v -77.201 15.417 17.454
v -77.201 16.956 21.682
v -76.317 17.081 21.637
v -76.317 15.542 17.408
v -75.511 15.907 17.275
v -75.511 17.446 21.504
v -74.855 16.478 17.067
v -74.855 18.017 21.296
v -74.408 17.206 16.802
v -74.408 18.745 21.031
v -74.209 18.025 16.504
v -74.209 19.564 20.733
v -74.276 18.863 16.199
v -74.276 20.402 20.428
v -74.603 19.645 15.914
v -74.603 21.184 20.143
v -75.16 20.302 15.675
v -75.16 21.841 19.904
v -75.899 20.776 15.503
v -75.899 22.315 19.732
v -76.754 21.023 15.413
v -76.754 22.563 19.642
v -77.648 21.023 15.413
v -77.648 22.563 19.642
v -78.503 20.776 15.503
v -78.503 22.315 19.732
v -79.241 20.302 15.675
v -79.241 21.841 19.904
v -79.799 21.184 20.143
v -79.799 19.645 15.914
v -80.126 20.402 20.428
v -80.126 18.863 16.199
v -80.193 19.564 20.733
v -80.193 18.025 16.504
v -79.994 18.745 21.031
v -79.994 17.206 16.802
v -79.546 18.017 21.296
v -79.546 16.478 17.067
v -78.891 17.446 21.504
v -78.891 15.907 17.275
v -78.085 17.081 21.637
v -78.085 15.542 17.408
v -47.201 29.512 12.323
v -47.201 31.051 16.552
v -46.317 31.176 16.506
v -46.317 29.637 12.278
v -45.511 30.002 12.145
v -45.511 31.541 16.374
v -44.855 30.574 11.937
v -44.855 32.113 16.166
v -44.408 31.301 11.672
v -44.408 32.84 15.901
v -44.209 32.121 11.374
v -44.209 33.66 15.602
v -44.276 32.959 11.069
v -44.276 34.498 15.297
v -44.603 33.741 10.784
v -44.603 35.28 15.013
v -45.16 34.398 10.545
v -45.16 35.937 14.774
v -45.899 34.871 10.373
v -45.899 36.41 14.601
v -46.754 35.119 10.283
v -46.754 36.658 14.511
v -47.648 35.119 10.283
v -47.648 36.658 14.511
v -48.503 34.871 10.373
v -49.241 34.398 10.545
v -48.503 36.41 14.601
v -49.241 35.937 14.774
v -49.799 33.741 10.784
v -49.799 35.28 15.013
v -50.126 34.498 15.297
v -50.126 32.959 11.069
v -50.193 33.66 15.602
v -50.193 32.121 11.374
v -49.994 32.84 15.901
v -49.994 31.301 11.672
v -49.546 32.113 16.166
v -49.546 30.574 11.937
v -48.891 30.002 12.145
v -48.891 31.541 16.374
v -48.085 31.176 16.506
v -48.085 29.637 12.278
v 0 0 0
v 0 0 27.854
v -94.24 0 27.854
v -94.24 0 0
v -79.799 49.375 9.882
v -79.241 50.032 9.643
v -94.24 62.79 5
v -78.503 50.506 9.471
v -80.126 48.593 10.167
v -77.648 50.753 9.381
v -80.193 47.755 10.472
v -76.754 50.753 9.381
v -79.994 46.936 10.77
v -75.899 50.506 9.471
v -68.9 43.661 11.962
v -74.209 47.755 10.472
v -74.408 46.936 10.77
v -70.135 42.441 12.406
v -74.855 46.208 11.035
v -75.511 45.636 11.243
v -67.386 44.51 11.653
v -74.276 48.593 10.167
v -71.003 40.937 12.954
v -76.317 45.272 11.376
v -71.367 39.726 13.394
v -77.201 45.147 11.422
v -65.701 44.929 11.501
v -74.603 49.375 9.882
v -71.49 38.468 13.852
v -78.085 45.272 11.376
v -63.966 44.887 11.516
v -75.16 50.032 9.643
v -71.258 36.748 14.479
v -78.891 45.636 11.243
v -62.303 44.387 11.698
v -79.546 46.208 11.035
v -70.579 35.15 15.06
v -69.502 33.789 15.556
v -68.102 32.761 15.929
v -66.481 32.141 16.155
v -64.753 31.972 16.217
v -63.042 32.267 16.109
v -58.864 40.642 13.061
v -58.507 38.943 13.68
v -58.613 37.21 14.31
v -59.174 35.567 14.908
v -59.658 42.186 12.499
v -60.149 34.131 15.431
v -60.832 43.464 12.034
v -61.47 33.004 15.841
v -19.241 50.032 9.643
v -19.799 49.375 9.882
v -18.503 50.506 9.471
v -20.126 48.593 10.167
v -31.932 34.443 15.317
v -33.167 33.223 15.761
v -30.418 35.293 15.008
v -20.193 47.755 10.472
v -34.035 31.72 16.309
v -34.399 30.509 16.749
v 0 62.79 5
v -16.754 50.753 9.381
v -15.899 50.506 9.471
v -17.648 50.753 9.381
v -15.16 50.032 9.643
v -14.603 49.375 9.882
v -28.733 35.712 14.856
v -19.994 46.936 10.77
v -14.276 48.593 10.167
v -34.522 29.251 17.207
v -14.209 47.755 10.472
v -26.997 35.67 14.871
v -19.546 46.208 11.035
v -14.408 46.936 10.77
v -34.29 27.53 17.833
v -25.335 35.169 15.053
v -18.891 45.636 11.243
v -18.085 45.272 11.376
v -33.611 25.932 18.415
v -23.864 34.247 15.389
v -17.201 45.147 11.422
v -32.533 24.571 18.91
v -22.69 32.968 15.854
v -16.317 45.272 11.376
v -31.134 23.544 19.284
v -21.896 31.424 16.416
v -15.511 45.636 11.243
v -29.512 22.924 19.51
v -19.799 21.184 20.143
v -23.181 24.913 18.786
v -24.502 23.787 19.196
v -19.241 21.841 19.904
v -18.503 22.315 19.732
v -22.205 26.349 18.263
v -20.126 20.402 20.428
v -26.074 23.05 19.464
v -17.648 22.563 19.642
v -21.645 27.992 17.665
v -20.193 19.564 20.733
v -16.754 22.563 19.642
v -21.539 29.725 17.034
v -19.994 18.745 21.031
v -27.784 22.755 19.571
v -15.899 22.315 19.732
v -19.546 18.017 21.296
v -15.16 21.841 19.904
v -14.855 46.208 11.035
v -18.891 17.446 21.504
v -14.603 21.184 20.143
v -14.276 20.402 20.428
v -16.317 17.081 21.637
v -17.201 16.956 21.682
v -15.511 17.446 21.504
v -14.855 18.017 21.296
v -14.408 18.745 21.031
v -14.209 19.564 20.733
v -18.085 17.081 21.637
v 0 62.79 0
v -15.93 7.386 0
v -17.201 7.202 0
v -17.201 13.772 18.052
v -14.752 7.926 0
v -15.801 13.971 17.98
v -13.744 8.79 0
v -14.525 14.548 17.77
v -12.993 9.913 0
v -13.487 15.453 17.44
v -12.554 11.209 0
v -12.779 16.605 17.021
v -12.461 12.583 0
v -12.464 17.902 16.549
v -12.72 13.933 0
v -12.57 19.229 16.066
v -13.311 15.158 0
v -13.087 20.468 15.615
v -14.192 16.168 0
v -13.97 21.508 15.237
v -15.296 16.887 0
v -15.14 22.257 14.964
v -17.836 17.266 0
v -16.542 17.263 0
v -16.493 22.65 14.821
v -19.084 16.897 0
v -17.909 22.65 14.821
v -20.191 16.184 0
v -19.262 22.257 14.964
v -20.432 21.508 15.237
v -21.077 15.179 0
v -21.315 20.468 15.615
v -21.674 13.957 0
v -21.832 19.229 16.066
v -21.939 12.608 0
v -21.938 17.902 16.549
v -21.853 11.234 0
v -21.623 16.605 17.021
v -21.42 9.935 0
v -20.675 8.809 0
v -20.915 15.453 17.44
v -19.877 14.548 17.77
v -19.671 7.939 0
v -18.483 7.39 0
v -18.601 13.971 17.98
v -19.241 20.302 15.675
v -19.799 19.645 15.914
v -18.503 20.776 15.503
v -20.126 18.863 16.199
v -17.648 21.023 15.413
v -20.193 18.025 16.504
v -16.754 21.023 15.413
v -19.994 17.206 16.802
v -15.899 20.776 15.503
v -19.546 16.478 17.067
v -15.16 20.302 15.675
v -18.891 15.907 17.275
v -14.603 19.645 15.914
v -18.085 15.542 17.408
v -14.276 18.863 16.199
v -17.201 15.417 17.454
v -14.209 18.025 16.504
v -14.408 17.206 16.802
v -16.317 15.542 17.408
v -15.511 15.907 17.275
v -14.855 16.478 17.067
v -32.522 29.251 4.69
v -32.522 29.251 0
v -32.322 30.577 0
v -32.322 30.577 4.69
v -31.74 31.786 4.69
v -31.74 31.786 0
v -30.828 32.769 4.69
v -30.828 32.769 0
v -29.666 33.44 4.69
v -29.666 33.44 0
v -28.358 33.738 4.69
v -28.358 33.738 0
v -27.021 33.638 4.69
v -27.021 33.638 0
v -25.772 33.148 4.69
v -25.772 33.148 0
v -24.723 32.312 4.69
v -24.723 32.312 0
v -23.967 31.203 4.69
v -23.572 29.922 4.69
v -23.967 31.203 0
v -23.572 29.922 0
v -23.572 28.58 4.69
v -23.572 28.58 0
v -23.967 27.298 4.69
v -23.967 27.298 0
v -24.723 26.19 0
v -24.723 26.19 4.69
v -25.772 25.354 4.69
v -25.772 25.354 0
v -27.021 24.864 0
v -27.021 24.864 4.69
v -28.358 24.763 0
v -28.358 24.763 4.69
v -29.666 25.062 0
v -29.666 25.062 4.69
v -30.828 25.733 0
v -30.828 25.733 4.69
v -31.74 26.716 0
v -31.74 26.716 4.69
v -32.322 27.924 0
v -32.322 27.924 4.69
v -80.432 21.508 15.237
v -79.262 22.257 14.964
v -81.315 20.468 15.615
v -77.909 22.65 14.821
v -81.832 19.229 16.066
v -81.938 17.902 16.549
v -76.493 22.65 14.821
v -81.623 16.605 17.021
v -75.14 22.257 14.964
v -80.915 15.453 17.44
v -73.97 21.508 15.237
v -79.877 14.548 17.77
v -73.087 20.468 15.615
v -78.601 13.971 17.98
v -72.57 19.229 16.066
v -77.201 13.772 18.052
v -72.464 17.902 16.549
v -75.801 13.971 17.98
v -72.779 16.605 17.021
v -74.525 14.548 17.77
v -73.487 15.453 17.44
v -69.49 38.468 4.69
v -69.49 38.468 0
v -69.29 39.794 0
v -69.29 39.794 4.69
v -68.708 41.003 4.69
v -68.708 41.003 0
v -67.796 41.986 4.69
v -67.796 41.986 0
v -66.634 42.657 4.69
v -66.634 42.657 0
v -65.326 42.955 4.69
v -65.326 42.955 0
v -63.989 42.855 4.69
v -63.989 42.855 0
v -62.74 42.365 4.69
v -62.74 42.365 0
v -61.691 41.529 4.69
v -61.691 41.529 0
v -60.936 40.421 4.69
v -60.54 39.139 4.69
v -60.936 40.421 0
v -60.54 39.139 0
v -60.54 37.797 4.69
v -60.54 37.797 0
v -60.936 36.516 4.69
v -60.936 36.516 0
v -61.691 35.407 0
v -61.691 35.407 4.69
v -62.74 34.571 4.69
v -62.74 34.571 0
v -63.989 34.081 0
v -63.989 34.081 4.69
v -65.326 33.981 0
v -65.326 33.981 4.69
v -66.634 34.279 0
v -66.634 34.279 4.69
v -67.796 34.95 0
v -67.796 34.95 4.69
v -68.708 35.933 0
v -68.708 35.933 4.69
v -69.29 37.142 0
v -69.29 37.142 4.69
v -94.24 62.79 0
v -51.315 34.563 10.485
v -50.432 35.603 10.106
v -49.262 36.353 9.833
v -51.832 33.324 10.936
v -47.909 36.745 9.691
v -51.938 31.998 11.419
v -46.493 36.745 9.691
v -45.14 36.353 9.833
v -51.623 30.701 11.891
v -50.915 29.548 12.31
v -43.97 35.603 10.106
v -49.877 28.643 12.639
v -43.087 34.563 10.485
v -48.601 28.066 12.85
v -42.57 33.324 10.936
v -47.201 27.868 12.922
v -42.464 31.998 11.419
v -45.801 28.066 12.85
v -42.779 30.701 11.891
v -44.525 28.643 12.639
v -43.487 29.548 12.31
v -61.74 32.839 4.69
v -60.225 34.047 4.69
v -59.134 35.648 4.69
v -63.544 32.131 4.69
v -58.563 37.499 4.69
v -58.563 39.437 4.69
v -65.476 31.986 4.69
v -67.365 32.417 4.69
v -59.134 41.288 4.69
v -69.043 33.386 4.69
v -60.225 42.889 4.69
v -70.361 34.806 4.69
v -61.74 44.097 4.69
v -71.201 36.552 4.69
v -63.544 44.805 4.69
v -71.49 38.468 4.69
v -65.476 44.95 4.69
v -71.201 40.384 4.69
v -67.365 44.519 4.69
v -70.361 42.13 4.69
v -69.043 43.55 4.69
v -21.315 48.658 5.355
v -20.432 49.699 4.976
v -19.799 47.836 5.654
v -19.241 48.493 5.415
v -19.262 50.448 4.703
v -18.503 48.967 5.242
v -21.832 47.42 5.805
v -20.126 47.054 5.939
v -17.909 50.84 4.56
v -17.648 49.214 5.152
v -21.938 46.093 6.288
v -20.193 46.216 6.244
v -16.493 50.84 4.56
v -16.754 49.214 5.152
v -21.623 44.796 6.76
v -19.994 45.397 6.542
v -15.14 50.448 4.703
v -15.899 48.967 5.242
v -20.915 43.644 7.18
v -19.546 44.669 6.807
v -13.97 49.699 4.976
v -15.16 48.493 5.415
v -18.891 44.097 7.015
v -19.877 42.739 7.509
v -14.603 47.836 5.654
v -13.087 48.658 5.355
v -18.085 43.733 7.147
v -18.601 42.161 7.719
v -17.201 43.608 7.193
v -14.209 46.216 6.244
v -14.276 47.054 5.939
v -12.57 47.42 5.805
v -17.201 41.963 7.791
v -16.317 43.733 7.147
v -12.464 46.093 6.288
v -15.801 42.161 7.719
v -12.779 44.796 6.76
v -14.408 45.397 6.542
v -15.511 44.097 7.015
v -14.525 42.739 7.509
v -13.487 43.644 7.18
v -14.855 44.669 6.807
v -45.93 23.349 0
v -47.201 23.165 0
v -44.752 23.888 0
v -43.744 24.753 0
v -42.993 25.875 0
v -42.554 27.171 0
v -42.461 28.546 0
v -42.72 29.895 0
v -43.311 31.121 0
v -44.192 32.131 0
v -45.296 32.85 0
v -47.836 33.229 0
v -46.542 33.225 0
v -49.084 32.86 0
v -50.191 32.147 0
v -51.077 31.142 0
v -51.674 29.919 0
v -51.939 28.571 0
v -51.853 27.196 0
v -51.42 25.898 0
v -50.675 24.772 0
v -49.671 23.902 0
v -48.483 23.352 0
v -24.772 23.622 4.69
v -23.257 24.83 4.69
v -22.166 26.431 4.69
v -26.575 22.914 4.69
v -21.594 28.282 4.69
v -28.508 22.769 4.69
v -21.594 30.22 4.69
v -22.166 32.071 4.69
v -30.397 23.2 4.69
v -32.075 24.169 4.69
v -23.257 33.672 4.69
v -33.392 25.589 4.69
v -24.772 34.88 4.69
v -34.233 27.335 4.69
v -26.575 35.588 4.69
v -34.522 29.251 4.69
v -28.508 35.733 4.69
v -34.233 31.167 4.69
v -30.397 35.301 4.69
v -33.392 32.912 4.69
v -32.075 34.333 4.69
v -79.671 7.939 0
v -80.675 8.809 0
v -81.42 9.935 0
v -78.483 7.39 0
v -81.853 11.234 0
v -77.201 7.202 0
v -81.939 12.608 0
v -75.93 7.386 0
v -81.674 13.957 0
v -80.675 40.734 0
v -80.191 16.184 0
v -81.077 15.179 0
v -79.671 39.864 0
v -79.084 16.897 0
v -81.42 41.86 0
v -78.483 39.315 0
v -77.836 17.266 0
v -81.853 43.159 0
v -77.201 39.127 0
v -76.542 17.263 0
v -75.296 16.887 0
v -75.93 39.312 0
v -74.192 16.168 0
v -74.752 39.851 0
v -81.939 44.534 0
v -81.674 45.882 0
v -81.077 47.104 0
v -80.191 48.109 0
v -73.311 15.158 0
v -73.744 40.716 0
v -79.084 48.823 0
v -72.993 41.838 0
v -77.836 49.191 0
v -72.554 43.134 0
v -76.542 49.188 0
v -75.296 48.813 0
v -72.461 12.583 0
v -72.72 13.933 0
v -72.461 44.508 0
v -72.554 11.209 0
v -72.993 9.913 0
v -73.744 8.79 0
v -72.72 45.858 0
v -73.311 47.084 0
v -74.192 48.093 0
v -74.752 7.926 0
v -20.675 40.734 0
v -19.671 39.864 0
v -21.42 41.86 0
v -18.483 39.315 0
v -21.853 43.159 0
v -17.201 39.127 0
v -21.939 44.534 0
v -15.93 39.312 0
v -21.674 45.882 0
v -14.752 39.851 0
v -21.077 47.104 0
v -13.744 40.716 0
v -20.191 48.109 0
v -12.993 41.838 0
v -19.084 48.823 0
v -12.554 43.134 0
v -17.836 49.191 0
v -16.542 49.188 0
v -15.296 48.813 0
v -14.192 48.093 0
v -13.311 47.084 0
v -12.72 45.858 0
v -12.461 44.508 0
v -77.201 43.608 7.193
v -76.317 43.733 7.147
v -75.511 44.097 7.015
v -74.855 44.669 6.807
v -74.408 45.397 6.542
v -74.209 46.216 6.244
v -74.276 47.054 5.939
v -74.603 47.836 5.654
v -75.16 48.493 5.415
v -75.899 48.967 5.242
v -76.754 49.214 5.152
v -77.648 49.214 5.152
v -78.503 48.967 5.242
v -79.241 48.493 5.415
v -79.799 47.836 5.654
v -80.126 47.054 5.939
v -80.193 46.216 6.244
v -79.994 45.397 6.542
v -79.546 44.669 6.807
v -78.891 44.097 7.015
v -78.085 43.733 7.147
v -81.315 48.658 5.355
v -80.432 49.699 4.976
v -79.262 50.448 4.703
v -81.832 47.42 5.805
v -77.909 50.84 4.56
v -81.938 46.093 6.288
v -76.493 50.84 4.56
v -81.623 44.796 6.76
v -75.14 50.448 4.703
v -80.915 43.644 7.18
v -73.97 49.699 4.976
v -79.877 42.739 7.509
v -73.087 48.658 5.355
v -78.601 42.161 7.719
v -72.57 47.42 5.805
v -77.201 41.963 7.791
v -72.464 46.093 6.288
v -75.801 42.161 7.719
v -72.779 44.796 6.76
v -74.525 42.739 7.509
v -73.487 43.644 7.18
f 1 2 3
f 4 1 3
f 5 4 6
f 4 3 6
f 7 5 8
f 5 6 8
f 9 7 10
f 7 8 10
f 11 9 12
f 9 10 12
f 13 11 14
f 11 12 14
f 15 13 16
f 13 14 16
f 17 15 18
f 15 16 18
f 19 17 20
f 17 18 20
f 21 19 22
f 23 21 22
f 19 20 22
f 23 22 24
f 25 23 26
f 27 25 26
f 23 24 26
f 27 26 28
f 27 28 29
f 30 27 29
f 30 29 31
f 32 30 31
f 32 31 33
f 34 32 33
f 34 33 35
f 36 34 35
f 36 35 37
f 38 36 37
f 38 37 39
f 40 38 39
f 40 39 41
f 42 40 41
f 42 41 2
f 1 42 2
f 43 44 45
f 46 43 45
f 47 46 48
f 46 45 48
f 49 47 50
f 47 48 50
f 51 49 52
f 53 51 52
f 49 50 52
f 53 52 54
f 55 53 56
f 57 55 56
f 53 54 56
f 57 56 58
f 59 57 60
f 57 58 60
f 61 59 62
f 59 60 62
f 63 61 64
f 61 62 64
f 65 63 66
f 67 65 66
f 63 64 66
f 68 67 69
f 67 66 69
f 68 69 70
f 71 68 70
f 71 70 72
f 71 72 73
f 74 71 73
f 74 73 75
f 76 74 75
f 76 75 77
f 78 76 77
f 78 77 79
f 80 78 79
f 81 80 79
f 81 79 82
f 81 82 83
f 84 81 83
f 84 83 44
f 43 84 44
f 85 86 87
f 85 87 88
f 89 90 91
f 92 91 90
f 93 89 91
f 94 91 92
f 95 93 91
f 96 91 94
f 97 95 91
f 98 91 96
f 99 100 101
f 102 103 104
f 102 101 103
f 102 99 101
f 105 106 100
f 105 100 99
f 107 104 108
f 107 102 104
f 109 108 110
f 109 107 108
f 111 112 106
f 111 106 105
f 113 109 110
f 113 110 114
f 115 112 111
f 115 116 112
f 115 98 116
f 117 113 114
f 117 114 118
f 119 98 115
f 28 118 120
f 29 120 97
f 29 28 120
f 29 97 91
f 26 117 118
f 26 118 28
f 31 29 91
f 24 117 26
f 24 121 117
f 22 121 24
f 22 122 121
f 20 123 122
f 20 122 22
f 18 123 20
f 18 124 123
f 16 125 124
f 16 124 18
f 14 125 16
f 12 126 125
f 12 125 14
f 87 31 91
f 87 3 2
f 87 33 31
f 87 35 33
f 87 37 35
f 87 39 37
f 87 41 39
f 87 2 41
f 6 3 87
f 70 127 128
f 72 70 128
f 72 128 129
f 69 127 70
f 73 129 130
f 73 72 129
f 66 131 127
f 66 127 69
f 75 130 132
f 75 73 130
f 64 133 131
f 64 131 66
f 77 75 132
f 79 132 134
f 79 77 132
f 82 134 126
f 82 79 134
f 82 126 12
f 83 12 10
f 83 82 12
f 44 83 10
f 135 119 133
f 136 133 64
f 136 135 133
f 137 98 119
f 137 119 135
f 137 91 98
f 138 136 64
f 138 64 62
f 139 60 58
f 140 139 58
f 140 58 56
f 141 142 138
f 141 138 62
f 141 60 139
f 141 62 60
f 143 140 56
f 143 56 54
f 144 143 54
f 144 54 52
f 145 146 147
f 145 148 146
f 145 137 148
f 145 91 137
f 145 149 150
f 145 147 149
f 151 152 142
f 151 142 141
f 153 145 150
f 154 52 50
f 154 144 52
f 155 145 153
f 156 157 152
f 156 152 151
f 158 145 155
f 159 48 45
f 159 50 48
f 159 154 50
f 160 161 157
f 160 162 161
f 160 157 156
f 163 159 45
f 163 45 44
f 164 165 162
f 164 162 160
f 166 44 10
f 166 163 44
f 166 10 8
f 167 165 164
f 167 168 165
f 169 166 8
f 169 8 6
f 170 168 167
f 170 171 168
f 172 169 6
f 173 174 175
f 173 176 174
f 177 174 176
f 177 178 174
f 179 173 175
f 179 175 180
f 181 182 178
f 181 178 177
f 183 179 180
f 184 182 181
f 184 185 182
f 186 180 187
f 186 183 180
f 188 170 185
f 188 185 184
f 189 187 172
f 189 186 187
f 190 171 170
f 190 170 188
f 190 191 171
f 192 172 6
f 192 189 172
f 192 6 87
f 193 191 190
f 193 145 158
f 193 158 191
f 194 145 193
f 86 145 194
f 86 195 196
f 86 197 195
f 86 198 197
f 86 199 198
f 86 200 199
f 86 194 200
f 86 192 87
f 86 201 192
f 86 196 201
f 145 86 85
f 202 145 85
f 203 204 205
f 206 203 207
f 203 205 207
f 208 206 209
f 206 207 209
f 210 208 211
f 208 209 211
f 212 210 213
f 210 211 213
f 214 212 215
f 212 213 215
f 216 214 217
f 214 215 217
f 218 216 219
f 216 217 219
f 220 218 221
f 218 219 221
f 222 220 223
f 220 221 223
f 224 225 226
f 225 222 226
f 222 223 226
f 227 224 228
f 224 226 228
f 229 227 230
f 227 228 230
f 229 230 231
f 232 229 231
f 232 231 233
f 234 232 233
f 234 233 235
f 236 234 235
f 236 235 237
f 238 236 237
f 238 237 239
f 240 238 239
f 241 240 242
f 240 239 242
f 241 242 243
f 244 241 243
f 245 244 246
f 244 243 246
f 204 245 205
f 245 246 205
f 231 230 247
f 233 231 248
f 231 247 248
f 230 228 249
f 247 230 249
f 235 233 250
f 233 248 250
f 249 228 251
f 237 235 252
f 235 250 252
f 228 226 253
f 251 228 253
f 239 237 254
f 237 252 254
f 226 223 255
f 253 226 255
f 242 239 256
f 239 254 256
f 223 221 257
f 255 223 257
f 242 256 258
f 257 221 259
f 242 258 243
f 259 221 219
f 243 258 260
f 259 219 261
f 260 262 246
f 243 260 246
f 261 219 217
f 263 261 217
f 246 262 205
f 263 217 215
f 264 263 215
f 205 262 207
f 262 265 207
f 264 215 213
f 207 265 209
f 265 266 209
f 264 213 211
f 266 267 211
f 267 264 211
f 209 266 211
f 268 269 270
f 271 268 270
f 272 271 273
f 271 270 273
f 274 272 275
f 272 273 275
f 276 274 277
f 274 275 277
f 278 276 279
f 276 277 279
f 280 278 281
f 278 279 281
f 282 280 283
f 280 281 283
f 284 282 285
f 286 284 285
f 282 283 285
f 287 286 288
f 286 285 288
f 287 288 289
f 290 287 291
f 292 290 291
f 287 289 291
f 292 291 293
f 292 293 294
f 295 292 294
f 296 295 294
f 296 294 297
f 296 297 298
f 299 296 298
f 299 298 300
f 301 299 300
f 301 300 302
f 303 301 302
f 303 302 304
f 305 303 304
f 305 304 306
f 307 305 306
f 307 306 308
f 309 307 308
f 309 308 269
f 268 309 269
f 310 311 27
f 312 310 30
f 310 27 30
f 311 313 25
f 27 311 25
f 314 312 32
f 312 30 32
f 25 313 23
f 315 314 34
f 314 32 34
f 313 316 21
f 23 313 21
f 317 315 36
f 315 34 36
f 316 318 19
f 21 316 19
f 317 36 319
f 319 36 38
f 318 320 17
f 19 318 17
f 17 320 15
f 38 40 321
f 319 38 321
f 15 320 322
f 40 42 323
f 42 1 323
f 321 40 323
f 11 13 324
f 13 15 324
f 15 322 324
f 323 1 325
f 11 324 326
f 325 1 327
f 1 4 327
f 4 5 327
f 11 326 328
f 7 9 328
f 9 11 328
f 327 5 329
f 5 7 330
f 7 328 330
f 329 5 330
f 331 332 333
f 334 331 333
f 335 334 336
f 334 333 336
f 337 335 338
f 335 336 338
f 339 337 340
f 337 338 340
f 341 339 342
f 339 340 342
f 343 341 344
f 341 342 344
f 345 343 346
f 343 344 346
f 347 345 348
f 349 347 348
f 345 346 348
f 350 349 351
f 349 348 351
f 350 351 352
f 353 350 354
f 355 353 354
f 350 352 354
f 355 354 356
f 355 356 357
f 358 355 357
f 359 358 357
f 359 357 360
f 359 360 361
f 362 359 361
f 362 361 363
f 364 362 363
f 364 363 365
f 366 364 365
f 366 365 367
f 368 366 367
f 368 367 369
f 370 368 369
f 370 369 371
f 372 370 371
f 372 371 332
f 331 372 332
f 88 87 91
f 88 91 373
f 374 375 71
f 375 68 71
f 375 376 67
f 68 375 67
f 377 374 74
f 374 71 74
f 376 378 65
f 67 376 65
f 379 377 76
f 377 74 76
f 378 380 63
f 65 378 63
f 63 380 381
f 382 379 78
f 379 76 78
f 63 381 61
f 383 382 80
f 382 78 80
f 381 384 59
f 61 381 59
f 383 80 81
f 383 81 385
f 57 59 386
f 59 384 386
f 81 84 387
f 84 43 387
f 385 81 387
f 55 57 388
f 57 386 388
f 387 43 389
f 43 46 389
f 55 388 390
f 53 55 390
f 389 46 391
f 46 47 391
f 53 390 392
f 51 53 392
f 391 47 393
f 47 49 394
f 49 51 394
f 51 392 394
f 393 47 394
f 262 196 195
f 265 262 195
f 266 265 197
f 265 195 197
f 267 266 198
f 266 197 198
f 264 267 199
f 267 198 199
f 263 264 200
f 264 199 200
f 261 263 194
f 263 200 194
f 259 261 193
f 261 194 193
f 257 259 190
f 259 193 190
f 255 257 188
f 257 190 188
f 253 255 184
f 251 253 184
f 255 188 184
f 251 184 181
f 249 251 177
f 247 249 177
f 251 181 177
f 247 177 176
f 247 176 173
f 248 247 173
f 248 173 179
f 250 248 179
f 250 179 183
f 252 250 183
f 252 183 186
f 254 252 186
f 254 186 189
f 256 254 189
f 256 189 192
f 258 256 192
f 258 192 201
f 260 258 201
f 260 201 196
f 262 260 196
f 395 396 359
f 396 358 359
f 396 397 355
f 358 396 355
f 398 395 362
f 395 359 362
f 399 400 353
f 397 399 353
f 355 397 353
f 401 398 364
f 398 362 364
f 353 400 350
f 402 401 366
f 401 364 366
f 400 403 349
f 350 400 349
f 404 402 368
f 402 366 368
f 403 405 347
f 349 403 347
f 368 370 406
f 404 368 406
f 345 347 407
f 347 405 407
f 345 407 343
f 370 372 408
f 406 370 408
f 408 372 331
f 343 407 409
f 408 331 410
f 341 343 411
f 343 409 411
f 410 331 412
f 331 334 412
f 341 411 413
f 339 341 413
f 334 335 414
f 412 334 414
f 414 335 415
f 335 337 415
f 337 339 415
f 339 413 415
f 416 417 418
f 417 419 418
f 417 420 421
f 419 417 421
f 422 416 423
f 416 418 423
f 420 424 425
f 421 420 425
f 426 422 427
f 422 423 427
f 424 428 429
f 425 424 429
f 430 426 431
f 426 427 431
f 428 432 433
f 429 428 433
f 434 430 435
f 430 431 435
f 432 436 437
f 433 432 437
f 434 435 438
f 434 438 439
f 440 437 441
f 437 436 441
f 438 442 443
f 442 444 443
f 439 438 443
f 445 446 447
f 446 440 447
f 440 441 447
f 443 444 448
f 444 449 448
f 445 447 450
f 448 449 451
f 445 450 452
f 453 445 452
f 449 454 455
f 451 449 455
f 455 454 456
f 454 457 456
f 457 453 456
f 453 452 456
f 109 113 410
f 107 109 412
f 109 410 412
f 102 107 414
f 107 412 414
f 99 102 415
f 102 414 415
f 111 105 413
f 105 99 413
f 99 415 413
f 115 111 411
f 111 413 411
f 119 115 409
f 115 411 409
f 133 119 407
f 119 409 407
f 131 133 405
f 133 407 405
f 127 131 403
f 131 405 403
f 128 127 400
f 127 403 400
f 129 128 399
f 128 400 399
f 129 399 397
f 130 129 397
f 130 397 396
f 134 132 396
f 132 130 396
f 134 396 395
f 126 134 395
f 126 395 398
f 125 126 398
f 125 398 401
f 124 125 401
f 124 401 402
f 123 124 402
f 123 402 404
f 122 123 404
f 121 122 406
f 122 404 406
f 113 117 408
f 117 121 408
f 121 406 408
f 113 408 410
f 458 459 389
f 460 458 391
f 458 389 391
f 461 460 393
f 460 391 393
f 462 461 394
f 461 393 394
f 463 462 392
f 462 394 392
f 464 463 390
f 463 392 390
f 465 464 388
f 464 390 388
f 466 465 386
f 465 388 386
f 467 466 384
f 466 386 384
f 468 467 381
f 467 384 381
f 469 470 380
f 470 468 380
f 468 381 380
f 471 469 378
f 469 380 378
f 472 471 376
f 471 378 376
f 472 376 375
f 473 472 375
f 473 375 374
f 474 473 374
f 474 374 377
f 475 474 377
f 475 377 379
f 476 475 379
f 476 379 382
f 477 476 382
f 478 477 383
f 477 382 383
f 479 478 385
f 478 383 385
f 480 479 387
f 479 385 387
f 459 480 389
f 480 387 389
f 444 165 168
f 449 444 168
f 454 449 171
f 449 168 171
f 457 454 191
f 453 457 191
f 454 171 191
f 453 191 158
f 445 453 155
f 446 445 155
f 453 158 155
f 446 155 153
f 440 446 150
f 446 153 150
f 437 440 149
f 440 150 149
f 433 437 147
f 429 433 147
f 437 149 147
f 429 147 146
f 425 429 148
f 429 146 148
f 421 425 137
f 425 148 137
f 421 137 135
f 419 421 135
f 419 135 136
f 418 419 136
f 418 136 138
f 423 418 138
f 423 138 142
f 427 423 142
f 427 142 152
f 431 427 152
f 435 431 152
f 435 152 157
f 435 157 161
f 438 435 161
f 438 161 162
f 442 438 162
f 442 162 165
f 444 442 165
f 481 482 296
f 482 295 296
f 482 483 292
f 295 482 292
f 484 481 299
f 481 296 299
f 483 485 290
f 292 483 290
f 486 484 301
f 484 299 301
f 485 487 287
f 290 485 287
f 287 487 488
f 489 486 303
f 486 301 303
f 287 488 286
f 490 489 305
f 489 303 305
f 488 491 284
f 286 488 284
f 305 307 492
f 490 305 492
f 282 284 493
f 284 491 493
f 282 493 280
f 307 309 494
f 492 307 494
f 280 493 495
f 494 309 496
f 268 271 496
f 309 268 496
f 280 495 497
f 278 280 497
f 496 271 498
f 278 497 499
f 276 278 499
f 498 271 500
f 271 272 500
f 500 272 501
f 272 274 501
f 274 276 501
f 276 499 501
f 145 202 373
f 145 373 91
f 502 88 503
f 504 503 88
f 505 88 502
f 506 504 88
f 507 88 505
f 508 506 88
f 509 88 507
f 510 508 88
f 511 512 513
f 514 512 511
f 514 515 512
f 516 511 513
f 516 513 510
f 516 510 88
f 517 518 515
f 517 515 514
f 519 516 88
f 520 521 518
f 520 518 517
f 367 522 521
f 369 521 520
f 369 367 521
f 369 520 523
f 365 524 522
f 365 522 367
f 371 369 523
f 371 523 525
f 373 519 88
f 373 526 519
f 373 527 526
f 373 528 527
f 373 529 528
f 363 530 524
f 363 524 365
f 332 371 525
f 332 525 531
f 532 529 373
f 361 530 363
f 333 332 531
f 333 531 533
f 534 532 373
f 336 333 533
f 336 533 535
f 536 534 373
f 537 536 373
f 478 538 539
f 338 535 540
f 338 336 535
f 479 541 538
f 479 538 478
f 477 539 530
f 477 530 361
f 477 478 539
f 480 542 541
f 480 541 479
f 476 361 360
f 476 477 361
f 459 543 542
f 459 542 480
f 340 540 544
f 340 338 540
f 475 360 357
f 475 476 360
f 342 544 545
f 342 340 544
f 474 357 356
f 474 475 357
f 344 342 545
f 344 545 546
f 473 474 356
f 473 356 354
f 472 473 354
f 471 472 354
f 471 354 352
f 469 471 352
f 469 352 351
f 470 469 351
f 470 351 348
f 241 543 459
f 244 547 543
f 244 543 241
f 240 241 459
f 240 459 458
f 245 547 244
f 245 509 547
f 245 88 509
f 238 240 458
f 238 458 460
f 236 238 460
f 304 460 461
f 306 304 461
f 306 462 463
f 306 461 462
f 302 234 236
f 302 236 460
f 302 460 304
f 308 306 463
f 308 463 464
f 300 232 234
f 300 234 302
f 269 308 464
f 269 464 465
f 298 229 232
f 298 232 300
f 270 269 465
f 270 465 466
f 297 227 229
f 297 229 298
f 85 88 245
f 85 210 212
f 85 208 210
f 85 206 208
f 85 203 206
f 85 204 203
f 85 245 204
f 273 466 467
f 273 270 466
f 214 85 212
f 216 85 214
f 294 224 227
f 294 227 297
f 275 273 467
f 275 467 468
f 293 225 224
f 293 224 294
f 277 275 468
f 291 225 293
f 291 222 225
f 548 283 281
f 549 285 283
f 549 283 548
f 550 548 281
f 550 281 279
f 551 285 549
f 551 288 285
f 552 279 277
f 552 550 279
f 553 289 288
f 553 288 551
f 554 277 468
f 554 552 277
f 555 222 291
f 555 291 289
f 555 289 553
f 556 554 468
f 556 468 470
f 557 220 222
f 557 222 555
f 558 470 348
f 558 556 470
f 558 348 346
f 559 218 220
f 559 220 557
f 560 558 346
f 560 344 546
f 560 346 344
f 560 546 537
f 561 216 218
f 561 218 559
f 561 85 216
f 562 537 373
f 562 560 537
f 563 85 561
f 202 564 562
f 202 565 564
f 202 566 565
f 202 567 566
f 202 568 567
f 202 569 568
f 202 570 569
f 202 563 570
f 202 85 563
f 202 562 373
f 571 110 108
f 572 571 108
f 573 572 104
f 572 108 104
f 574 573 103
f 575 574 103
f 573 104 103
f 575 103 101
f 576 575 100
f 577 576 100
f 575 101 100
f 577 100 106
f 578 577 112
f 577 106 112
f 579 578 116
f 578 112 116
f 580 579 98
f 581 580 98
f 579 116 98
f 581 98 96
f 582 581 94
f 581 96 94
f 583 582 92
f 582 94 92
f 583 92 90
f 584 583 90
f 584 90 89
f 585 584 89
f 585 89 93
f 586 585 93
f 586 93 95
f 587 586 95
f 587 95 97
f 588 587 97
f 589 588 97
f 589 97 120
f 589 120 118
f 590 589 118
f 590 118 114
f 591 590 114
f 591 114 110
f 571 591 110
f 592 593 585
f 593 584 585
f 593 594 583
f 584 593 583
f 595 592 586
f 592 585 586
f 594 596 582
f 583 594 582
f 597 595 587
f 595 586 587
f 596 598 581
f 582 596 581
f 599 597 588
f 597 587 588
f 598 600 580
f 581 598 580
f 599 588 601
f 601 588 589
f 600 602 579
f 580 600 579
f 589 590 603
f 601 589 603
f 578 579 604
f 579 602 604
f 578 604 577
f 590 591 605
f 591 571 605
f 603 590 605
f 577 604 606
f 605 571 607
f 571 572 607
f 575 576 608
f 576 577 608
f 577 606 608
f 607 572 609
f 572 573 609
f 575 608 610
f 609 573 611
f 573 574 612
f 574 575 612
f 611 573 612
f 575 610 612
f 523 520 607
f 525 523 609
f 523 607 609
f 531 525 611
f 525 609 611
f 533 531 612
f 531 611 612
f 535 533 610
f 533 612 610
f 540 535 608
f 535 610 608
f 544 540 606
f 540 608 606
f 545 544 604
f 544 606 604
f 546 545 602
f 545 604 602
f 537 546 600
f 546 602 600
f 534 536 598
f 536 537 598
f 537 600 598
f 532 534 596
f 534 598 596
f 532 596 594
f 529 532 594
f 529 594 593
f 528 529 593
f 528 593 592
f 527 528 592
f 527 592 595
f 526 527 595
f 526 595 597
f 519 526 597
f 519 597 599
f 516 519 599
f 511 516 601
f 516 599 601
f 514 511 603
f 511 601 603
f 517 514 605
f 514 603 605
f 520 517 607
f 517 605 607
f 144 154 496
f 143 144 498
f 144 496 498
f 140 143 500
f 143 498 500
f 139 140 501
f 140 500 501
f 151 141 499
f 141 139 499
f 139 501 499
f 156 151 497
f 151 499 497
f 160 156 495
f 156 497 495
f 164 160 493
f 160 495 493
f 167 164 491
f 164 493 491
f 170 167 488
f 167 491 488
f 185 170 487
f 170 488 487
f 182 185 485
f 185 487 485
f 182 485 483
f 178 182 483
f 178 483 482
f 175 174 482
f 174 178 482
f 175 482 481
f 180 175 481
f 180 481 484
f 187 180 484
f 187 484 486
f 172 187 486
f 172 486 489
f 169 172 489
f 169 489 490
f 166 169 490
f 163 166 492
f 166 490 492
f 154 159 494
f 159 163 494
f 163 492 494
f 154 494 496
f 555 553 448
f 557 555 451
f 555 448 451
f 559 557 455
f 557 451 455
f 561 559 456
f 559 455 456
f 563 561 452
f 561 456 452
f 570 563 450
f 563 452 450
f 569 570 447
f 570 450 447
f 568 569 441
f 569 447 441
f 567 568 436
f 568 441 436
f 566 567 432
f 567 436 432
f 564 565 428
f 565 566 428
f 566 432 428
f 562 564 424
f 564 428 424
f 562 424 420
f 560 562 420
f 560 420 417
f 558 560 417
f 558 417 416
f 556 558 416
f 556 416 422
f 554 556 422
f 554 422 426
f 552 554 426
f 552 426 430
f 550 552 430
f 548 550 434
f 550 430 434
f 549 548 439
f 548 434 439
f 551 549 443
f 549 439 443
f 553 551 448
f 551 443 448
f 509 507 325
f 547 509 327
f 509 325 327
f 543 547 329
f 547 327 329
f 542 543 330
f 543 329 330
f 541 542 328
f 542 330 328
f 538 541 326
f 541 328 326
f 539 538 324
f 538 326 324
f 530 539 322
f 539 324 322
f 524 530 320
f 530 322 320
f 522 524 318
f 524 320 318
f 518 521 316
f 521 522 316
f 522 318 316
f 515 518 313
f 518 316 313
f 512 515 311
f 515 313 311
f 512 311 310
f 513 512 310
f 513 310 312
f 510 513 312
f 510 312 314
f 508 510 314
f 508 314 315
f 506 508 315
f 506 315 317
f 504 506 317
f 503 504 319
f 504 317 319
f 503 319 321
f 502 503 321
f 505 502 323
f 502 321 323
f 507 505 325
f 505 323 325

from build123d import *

# Parameters (mm, degrees)
BOSS_EXTRUDE1_DEPTH = 94.24
SKETCH2_R           = 4.5
CUT_EXTRUDE1_DEPTH  = 94.24
CUT_EXTRUDE2_START  = -4.69
SKETCH2_3_R         = 6.5
CUT_EXTRUDE2_DEPTH  = 94.24
SKETCH3_R           = 3
CUT_EXTRUDE3_DEPTH  = 94.24
CUT_EXTRUDE4_START  = -4.5
SKETCH3_3_R         = 4.75
CUT_EXTRUDE4_DEPTH  = 94.24


with BuildPart() as part:
    # Sketch1 → Boss-Extrude1 (new body)
    with BuildSketch(Plane(origin=(0, 0, 0), x_dir=(0, 0, -1), z_dir=(1, 0, 0))):
        Polygon((0, 0), (0, 62.78974436), (-5, 62.78974436), (-27.85359797, 0), align=None)
    extrude(amount=-BOSS_EXTRUDE1_DEPTH)

    # Sketch2 → Cut-Extrude1 (cut)
    with BuildSketch(Plane(origin=(0, 0, 0), x_dir=(-1, 0, 0), z_dir=(0, 0, -1))):
        with Locations((28.02184799, 29.25081122)):
            Circle(SKETCH2_R)
        with Locations((64.99011516, 38.46803544)):
            Circle(SKETCH2_R)
    extrude(amount=-CUT_EXTRUDE1_DEPTH, mode=Mode.SUBTRACT)

    # Sketch2<3> → Cut-Extrude2 (cut)
    with BuildSketch(Plane(origin=(0, 0, 0), x_dir=(-1, 0, 0), z_dir=(0, 0, -1)).offset(CUT_EXTRUDE2_START)):
        with Locations((28.02184799, 29.25081122)):
            Circle(SKETCH2_3_R)
        with Locations((64.99011516, 38.46803544)):
            Circle(SKETCH2_3_R)
    extrude(amount=-CUT_EXTRUDE2_DEPTH, mode=Mode.SUBTRACT)

    # Sketch3 → Cut-Extrude3 (cut)
    with BuildSketch(Plane(origin=(0, 8.951973832, 24.595345956), x_dir=(1, 0, 0), z_dir=(0, 0.3420201434019967, 0.9396926207581273))):
        with Locations((-17.20092637, 11.517541778)):
            Circle(SKETCH3_R)
        with Locations((-17.20092637, 41.517541778)):
            Circle(SKETCH3_R)
        with Locations((-47.20092637, 26.517541778)):
            Circle(SKETCH3_R)
        with Locations((-77.20092637, 41.517541778)):
            Circle(SKETCH3_R)
        with Locations((-77.20092637, 11.517541778)):
            Circle(SKETCH3_R)
    extrude(amount=-CUT_EXTRUDE3_DEPTH, mode=Mode.SUBTRACT)

    # Sketch3<3> → Cut-Extrude4 (cut)
    with BuildSketch(Plane(origin=(0, 8.951973832, 24.595345956), x_dir=(1, 0, 0), z_dir=(0, 0.3420201434019967, 0.9396926207581273)).offset(CUT_EXTRUDE4_START)):
        with Locations((-17.20092637, 11.517541778)):
            Circle(SKETCH3_3_R)
        with Locations((-17.20092637, 41.517541778)):
            Circle(SKETCH3_3_R)
        with Locations((-47.20092637, 26.517541778)):
            Circle(SKETCH3_3_R)
        with Locations((-77.20092637, 11.517541778)):
            Circle(SKETCH3_3_R)
        with Locations((-77.20092637, 41.517541778)):
            Circle(SKETCH3_3_R)
    extrude(amount=-CUT_EXTRUDE4_DEPTH, mode=Mode.SUBTRACT)


solid = part.part
